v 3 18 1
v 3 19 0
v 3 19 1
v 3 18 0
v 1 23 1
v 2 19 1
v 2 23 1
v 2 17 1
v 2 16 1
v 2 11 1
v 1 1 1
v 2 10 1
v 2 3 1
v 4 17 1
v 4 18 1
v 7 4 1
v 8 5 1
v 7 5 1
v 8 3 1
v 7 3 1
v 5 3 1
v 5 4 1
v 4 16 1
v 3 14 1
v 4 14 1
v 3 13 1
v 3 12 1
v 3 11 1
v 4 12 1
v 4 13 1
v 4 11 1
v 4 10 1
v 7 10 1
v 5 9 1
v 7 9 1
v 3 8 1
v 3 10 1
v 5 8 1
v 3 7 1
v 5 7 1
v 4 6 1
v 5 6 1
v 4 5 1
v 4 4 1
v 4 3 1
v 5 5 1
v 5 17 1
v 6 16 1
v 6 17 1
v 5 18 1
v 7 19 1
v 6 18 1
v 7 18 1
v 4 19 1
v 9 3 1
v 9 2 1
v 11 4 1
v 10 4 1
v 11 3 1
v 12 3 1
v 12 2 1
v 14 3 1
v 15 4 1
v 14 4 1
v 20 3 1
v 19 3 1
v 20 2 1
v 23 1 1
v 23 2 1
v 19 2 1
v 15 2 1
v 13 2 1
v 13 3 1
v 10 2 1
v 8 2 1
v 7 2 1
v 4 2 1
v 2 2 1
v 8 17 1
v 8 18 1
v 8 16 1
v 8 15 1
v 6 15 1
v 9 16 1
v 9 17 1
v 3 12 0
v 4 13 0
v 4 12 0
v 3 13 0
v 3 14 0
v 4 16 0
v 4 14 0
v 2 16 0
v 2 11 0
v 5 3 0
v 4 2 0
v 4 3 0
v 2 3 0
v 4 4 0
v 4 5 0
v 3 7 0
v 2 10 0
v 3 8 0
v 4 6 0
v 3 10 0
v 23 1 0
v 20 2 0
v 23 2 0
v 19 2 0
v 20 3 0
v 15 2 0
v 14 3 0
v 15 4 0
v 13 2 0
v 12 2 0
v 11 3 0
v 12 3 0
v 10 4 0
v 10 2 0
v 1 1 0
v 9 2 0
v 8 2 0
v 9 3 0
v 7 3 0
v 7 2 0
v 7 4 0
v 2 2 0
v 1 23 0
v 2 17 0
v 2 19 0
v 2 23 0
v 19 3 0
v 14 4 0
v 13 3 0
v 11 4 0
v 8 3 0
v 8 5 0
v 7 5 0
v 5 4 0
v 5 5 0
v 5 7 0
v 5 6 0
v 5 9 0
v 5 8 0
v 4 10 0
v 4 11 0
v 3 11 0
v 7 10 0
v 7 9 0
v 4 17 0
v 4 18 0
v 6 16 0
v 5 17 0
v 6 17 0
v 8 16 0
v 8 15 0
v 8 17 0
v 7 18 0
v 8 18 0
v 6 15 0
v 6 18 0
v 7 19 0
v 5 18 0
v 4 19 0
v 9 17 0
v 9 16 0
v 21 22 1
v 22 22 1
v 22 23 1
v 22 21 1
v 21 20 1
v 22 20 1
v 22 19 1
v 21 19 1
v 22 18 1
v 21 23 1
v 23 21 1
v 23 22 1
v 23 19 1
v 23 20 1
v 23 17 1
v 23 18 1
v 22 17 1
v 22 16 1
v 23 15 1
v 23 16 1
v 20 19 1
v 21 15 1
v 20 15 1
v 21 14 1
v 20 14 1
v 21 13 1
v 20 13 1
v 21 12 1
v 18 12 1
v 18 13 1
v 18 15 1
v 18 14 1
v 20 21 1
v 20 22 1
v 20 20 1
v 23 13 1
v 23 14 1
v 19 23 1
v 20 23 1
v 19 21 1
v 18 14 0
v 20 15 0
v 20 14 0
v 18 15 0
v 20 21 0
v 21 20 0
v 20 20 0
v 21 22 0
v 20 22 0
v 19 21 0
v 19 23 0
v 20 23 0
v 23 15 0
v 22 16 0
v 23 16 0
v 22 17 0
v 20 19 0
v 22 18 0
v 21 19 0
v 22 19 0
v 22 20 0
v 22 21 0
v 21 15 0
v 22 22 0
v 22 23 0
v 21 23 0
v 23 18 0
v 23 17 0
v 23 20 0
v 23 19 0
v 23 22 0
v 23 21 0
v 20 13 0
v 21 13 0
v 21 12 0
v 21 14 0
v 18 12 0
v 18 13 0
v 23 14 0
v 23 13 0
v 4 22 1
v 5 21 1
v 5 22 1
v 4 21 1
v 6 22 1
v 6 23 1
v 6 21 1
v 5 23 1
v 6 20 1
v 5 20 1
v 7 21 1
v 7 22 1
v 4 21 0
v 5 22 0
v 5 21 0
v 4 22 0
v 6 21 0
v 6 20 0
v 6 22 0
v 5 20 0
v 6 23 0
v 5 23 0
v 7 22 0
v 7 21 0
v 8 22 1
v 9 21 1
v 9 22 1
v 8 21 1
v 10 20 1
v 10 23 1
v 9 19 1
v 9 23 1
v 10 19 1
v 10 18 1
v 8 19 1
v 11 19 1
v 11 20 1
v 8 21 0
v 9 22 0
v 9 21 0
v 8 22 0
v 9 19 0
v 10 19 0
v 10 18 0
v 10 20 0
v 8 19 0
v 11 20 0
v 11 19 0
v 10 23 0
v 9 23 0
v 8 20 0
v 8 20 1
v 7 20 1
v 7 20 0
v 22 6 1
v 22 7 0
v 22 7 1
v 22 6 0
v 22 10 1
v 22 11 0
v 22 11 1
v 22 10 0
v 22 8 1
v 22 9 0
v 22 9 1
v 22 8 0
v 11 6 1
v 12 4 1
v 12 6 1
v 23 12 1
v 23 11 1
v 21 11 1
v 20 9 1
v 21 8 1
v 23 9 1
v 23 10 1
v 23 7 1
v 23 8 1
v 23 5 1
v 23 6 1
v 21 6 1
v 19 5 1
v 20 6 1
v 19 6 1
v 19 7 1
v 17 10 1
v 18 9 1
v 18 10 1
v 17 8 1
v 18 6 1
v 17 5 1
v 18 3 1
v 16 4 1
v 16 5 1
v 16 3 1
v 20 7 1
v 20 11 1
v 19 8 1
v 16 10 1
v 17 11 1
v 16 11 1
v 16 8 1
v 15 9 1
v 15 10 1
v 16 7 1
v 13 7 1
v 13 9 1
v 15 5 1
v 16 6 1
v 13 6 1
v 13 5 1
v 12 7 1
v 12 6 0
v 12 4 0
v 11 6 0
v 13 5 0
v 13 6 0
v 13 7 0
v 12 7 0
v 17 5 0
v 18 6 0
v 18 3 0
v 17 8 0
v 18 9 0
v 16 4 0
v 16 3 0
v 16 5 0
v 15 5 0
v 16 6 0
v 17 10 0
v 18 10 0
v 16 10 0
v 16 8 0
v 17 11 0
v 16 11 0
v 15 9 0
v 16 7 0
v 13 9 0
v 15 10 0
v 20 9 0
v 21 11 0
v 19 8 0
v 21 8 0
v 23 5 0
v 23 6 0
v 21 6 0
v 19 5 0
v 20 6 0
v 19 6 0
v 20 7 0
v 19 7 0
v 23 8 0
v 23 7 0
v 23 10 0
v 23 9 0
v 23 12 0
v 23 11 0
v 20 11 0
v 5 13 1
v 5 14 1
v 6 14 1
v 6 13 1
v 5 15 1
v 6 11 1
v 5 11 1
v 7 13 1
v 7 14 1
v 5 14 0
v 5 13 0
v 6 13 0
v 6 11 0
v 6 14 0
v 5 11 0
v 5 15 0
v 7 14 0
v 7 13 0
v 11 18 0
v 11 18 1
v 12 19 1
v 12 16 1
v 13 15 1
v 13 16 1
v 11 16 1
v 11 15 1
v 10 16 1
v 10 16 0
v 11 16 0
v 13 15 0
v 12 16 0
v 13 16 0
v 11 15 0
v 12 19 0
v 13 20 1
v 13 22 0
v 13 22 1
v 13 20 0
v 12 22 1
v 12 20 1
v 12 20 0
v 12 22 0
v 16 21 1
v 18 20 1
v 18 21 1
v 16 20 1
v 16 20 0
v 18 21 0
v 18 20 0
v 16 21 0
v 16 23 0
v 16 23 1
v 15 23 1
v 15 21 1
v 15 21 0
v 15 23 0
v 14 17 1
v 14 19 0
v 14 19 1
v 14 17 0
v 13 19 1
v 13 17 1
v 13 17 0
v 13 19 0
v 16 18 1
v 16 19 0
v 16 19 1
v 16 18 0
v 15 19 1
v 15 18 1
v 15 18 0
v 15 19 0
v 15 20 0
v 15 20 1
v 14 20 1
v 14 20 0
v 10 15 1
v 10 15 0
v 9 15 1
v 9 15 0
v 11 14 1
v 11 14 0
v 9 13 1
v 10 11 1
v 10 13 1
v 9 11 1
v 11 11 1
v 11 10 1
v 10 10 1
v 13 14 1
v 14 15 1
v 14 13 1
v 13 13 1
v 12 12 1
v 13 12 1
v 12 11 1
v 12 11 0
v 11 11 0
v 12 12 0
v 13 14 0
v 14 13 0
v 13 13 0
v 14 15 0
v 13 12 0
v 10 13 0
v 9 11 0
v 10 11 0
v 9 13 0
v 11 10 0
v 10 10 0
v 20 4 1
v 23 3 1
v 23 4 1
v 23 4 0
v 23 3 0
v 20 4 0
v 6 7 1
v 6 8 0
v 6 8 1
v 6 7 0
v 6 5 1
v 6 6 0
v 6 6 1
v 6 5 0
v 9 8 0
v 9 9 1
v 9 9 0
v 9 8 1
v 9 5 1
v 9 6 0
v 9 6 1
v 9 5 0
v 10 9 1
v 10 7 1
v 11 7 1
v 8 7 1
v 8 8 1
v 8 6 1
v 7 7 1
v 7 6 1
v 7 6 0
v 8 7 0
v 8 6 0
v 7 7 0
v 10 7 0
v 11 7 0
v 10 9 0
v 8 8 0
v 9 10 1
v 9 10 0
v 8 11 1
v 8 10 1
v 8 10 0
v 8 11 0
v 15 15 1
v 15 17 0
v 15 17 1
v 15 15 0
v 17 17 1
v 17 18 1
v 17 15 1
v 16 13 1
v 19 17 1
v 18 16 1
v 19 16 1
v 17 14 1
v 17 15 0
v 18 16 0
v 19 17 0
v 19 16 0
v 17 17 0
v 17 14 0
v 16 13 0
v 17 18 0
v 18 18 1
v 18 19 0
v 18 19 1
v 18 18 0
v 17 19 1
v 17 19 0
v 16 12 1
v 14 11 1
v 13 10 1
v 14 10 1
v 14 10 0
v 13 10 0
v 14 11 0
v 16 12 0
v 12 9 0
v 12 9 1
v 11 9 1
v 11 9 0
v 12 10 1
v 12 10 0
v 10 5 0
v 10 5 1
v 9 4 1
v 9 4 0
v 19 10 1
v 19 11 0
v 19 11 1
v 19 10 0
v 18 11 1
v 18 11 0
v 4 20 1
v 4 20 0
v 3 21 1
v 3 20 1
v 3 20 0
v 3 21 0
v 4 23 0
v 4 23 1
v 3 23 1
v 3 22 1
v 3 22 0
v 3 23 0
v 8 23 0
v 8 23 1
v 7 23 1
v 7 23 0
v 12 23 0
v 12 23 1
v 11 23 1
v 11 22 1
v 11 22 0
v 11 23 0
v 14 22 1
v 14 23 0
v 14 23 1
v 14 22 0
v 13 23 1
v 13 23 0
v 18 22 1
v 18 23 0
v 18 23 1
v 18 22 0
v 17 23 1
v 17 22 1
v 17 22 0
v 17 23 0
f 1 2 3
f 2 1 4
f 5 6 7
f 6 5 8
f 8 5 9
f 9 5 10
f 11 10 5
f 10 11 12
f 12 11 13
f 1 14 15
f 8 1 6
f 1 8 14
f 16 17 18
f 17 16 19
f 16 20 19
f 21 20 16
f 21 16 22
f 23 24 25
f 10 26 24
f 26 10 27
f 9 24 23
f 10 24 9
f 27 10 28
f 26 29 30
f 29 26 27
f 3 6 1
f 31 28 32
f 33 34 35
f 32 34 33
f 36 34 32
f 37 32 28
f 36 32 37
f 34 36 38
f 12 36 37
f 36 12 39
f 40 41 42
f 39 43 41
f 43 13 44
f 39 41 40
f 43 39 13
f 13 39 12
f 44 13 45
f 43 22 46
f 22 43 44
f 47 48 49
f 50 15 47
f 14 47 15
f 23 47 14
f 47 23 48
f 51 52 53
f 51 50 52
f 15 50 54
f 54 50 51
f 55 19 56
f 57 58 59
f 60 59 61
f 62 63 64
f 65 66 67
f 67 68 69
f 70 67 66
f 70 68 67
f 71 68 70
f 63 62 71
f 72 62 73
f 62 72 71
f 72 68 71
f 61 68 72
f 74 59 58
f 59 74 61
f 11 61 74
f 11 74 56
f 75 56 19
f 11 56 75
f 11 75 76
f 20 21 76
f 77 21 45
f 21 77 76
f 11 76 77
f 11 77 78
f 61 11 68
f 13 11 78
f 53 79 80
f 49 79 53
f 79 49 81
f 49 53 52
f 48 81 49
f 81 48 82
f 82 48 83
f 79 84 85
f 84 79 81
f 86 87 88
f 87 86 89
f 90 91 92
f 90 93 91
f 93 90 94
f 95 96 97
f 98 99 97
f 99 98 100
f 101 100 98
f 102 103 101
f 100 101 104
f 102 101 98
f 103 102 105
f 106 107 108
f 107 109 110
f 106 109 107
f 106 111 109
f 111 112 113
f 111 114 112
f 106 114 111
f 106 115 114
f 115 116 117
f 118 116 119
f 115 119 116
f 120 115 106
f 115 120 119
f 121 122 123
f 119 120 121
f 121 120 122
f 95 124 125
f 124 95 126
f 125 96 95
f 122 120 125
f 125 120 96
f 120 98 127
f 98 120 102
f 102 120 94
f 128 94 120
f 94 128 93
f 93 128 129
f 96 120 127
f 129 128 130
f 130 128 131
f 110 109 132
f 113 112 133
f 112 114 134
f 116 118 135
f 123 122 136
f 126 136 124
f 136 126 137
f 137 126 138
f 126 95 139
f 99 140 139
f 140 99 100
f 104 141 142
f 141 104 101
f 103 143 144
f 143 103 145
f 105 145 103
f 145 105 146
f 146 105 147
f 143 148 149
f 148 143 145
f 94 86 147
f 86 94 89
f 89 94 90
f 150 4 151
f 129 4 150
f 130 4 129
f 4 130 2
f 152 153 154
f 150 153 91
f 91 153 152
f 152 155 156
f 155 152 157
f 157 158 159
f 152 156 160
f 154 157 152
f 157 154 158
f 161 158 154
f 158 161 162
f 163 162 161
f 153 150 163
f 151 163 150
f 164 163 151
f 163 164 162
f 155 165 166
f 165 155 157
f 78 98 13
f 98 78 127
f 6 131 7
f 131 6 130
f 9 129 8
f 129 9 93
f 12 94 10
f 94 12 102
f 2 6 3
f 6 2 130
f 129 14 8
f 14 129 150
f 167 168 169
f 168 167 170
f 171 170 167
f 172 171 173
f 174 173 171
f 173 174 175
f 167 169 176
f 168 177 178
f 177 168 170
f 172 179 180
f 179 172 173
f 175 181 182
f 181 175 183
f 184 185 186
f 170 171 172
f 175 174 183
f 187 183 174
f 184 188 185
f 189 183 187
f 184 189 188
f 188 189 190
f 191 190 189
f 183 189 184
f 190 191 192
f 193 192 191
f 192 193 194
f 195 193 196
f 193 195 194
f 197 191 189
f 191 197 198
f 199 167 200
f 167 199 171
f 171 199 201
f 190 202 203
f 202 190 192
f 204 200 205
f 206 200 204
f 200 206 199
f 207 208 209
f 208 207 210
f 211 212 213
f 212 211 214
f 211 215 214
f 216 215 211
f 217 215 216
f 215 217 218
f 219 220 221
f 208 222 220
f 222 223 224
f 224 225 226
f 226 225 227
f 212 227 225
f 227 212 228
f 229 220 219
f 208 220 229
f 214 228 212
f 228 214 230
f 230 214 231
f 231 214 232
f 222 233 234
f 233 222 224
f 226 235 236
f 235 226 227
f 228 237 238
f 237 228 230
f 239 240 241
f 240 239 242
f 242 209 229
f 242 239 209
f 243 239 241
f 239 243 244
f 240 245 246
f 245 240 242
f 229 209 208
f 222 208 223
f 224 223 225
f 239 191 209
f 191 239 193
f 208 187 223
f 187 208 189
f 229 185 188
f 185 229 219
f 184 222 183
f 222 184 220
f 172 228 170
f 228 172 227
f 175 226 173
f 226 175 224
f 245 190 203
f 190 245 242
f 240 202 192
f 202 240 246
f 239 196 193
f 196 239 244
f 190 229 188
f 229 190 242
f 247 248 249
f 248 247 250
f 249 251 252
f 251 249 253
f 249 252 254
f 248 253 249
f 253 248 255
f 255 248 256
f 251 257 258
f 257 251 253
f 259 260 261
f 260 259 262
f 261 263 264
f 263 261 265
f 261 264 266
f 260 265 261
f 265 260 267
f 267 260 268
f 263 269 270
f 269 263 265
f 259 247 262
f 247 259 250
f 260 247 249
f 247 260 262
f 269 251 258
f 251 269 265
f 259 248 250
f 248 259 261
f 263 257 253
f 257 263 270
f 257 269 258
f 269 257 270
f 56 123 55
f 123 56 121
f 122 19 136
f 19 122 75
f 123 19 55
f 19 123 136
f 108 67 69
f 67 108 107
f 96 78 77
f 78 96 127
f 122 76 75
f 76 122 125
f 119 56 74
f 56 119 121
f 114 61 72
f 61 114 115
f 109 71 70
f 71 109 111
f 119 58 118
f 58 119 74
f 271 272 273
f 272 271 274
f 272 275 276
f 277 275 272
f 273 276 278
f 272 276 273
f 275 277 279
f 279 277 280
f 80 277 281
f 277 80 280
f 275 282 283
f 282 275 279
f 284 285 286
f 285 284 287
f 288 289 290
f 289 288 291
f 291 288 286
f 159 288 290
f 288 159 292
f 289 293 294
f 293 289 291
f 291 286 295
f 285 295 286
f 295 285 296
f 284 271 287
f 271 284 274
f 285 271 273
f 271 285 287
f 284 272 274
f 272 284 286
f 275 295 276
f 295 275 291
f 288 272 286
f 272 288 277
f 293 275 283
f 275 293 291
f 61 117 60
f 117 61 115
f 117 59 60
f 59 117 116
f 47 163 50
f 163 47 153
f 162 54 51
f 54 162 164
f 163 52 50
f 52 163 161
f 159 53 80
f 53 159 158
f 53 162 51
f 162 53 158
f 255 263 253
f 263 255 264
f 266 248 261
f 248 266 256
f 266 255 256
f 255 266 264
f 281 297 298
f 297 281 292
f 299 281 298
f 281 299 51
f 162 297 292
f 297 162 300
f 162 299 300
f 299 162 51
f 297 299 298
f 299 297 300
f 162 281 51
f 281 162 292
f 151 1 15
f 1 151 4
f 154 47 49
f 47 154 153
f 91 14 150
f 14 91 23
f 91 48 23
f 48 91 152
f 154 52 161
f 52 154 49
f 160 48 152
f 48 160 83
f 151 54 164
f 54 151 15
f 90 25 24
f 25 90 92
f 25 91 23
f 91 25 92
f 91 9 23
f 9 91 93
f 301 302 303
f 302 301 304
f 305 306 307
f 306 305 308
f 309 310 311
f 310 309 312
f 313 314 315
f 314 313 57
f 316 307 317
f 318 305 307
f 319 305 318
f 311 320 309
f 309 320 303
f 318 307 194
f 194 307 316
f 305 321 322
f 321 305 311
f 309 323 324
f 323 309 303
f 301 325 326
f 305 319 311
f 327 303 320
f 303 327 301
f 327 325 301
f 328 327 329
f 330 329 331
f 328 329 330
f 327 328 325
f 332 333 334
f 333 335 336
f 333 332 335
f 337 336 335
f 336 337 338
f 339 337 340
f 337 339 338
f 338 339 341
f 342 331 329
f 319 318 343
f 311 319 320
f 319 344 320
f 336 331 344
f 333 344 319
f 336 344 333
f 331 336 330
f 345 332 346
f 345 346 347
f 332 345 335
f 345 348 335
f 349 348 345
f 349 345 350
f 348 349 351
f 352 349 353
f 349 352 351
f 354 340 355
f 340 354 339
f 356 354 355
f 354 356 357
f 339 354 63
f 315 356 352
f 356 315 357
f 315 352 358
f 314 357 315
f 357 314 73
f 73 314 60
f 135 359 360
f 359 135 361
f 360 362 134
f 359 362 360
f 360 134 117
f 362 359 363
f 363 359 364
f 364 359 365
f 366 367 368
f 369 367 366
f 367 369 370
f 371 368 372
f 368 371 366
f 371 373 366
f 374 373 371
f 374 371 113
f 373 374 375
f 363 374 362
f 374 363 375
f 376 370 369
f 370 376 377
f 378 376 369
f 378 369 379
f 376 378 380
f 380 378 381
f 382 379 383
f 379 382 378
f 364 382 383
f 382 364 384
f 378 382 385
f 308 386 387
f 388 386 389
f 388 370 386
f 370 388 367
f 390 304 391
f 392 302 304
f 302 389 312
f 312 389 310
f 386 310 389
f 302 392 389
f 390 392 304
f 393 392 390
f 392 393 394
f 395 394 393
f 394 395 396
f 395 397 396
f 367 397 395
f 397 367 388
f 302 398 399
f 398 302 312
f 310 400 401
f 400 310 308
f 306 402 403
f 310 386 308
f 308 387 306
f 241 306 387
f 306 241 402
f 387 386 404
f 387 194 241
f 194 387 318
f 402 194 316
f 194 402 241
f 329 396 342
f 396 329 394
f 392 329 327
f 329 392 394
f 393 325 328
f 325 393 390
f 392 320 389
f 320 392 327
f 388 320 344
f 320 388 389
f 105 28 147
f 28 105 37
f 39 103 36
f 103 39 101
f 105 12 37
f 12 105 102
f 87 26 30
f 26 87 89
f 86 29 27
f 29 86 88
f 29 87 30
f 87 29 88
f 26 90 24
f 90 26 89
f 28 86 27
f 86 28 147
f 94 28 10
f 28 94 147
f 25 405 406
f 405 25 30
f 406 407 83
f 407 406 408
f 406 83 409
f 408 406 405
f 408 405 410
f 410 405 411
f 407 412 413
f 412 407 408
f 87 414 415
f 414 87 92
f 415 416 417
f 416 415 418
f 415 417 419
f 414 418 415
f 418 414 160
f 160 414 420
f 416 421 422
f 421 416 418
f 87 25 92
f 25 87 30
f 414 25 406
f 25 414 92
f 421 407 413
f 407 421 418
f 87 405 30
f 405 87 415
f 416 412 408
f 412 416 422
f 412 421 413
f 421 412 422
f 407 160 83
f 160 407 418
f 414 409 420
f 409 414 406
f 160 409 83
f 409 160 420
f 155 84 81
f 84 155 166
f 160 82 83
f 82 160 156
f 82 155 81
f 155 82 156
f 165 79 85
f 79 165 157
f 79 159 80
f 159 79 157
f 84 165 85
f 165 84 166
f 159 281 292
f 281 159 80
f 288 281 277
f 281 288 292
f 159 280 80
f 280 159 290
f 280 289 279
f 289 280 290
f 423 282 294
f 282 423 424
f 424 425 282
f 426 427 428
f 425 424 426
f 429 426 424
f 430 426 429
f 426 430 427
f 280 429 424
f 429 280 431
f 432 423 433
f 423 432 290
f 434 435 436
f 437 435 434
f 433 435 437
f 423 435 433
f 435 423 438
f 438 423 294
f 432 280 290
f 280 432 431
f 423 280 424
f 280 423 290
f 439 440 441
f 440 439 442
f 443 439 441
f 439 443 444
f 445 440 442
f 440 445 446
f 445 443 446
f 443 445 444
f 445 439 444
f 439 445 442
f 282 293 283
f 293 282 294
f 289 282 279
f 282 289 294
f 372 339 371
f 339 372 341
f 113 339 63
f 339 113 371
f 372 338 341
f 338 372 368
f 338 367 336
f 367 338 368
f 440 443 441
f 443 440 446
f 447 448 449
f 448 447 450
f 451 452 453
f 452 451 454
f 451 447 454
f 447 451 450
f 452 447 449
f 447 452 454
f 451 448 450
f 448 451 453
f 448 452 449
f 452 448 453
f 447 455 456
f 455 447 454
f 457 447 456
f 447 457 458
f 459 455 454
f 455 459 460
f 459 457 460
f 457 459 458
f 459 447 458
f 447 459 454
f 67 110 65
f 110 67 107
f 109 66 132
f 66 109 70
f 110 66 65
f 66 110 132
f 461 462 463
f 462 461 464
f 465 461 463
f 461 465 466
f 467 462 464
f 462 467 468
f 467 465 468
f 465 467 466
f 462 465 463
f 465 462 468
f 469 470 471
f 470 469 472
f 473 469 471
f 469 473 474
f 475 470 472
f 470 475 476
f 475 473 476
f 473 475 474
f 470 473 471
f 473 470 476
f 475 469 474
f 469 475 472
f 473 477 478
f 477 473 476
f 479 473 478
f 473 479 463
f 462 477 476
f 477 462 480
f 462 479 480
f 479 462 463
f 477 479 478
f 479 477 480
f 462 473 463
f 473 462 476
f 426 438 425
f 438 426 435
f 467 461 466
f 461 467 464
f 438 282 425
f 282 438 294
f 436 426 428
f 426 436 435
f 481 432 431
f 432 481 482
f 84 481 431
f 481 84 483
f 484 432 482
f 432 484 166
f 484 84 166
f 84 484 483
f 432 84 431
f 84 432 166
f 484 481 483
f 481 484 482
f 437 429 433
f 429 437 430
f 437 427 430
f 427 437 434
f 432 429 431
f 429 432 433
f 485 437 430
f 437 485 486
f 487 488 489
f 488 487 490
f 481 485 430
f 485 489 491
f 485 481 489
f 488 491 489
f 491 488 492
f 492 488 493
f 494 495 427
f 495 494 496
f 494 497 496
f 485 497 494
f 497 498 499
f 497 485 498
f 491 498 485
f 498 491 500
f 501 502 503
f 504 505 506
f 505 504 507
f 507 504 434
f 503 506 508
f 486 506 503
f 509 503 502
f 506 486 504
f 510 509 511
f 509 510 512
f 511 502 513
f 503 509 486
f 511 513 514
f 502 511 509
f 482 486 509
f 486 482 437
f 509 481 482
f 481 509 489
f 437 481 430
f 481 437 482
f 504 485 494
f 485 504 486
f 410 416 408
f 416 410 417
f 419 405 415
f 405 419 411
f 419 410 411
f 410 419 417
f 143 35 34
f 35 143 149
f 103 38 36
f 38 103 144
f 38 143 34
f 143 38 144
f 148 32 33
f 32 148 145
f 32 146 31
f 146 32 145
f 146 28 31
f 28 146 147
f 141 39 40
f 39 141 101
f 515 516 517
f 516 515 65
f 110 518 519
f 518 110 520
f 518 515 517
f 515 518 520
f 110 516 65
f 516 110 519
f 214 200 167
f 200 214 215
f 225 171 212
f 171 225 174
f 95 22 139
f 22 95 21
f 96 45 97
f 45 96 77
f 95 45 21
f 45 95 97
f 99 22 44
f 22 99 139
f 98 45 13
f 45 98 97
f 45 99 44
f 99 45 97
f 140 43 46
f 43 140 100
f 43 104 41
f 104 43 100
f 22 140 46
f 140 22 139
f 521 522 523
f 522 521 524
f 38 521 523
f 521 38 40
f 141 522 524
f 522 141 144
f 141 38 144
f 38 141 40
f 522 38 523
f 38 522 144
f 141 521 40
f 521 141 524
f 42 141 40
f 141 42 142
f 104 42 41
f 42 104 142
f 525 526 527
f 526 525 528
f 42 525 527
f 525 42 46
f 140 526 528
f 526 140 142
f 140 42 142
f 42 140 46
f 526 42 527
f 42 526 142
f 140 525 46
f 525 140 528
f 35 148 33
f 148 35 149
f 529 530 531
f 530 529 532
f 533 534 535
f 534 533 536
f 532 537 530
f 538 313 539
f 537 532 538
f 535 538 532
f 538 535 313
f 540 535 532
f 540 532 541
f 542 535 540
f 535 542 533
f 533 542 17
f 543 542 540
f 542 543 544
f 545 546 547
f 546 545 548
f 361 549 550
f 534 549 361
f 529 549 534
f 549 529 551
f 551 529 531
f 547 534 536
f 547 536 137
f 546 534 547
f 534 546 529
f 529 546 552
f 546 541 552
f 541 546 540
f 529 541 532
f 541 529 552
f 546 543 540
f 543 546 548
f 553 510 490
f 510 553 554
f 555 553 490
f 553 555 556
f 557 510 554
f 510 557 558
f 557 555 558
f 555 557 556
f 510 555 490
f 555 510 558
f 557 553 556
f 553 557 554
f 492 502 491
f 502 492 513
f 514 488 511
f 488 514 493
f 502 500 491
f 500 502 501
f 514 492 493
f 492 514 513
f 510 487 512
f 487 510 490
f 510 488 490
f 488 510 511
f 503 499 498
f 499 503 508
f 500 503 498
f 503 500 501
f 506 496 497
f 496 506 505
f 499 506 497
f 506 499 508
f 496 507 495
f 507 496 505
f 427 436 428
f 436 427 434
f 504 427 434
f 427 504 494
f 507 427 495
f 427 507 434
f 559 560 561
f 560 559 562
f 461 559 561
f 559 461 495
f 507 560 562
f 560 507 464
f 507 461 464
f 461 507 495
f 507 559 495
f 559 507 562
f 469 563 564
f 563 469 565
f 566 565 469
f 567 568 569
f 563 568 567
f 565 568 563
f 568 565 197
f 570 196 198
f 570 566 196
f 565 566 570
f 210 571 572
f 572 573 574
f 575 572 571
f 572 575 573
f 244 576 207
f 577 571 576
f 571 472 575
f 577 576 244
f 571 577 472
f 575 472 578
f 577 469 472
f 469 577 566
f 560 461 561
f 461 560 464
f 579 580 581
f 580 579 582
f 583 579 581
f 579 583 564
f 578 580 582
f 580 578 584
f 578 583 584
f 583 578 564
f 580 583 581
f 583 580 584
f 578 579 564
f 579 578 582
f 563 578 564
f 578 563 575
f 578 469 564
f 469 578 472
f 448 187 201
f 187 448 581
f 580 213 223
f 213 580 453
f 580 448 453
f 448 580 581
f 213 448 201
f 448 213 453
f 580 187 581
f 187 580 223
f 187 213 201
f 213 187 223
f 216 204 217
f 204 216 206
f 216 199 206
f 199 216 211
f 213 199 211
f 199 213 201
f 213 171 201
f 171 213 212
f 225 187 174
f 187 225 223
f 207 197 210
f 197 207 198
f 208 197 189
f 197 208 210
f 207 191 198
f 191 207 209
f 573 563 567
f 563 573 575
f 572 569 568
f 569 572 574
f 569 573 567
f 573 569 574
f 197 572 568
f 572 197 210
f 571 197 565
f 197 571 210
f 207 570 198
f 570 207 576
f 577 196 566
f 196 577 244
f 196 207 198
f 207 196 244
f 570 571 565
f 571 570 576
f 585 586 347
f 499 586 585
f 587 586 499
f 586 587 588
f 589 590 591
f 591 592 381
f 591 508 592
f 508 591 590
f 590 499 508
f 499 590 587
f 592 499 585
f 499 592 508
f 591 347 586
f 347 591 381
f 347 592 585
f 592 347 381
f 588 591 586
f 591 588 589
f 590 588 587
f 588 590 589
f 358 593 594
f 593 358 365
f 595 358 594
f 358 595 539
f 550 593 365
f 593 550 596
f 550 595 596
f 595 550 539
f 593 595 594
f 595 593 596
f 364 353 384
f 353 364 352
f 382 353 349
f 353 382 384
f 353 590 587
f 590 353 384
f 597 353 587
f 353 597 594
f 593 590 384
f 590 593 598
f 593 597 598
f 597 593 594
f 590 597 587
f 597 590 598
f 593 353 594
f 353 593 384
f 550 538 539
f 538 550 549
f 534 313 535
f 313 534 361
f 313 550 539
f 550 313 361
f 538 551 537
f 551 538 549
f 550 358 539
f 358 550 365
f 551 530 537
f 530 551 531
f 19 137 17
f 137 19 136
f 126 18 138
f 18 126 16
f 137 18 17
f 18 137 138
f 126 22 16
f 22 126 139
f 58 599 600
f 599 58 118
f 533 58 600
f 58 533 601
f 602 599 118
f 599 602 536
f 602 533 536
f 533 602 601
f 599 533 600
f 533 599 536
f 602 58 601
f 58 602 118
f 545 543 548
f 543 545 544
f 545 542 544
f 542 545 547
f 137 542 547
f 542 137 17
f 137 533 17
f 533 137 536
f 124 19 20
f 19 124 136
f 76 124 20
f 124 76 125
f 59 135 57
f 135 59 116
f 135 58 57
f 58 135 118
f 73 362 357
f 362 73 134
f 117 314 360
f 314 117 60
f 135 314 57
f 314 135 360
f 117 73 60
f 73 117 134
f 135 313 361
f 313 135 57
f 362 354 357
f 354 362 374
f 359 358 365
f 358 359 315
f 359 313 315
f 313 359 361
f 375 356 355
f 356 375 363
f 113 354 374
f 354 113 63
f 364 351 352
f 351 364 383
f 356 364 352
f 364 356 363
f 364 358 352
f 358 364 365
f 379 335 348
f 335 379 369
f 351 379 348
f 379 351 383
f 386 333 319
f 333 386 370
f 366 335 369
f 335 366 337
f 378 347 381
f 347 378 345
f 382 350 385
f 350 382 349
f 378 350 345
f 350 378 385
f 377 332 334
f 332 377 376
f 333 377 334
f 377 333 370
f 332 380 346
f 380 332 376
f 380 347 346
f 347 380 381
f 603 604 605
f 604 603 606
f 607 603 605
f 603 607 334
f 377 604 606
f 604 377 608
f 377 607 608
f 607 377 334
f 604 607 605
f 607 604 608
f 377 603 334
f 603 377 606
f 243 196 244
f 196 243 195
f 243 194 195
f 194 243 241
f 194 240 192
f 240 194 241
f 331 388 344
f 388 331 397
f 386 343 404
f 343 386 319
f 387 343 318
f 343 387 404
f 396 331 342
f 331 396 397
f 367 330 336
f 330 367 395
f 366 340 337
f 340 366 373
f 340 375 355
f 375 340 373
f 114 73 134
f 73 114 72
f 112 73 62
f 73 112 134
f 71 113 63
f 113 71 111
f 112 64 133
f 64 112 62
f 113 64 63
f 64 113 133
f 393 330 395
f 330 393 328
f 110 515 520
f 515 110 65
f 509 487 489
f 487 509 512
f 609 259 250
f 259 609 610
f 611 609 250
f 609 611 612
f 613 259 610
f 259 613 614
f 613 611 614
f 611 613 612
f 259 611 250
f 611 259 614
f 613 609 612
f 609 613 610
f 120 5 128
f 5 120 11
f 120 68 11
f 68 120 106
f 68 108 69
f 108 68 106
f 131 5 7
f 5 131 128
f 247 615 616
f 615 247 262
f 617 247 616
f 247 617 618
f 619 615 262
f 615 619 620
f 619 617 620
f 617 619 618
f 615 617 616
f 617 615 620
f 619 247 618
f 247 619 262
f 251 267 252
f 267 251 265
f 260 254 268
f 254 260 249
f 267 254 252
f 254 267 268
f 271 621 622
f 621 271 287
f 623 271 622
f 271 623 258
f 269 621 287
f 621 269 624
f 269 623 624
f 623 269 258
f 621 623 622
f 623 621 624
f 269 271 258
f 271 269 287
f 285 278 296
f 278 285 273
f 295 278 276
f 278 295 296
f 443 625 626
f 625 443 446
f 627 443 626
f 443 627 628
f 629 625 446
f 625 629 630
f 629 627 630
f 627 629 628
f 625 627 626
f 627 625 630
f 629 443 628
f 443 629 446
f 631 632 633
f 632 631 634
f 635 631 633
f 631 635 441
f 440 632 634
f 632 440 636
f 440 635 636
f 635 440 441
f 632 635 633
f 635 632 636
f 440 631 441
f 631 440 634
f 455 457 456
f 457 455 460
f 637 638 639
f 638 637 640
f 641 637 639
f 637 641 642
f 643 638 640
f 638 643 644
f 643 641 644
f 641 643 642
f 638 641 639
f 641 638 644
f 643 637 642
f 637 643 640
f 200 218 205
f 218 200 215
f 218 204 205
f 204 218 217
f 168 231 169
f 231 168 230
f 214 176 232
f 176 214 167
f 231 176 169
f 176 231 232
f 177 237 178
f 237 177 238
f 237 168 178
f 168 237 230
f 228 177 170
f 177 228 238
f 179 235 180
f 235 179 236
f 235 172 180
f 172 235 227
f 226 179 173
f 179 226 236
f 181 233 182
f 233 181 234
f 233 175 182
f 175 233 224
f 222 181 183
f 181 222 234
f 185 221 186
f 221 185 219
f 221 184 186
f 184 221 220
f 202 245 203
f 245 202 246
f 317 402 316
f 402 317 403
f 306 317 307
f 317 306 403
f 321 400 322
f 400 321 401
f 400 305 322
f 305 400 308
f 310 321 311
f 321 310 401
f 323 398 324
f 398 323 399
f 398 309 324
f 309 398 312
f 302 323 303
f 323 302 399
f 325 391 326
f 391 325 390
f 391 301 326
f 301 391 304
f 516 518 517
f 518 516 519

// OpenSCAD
// file: ../../util/bitmap.scad
/*****************************************************************************
 * Module Bitmap Library
 * Modules to create bitmaps of unit squares from 1 or 2 dimensional vectors.
 *****************************************************************************
 * Copyright 2017 Chris Baker
 *
 * This program is free software: you can redistribute it and/or modify
 * it under the terms of the GNU Lesser General Public License as published by
 * the Free Software Foundation, either version 3 of the License, or
 * (at your option) any later version.
 *
 * This program is distributed in the hope that it will be useful,
 * but WITHOUT ANY WARRANTY; without even the implied warranty of
 * MERCHANTABILITY or FITNESS FOR A PARTICULAR PURPOSE.  See the
 * GNU Lesser General Public License for more details.
 *
 * You should have received a copy of the GNU Lesser General Public License
 * along with this program.  If not, see <http://www.gnu.org/licenses/>.
 *****************************************************************************
 * Usage:
 * Include this file with the "use" tag.
 * Depends on compat.scad library.
 *
 * API:
 *   1dbitmap(bitmap, center, expansion, vector_mode)
 *   2dbitmap(bitmap, center, expansion, vector_mode)
 *     Generate a 1 or 2-Dimensional field of modules based on the provided
 *     bitmap vector. See Bitmap Vectors below.
 *     The center flag determines whether to center the bitmap on the origin.
 *     The expansion value actually shrinks each cube in the x and y
 *     dimension by the specified amount.
 *     The vector_mode flag determines whether to create 3D solid geometry
 *     (unit cubes) or 2D vector geometry (squares).
 *
 * Bitmap Vectors:
 *   The bitmap vectors primarily provide boolean information.
 *   A module will be placed where these vectors have a postive value and
 *   skipped where they have a negative value. I.E. 0, -1, false, and undef
 *   are all equivalent and result in a skip. 1 and true are equivalent and
 *   result in a placed 1-unit module.
 *   Further, if the value is an integer it will be treated as a height for
 *   the module, allowing z-maps to be created.
 *   If the value is not an integer or boolean, it will be treated as a color
 *   reference. This can be a string or RGBA vector that will be used to
 *   color the module in the OpenSCAD preview window.
 *   In current versions of OpenSCAD, the color has no effect in the rendered
 *   view or STL output.
 *
 * Vector Mode:
 *   Although OpenSCAD supports generating 2D geometry, there are several
 *   caveats:
 *   - 2D and 3D geometry cannot be mixed
 *   - Extruding 2D geometry causes color information to be lost
 *   - All 2D geometry is projected onto the XY plane when rendering
 *   - Rendering also results in loss of color (same as 3D)
 *   - The SVG exporter is somewhat limited:
 *     - The pixel size of the image is hard-coded in the file
 *     - The title of the image is a generic string
 *     - The color selection for stroke and fill is fixed
 *     - The stroke-width is set to a large value that will cause overlap
 *     - The background is transparent
 *     - Only one path element is created with all of the geometry; there is
 *       no easy way to split up the geometry into multiple logical units.
 *     - These issues can mostly be resolved by hand-editing the file:
 *       - Remove or modify the width and height parameters from the svg
 *         element at the top of the file to provide better scaling.
 *       - Edit the title element at the top of the file to change the title.
 *       - Edit the stroke and fill parameters of the path element (these will
 *         probably be at the end of the file).
 *       - Set the stroke-width parameter for the path element to 0.
 *****************************************************************************/
use <compat.scad>

/*
 * 2dbitmap - Turn a 2D vector into a bitmap of cubes
 *
 * bitmap - 2D vector representing where to place each cube
 *          Value can either be boolean, z-height, or color
 * center - center cubes around the origin
 * expansion - size of gap around each pixel (screendoor)
 * vector_mode - create a 2D vector drawing instead of 3D extrusion
 */
module 2dbitmap(bitmap=[[1,0],[0,1]], center=false, expansion=0, vector_mode=false)
{
	ylen=len(bitmap)-1;

	for (y=[0:ylen]) {
		xlen=len(bitmap[y])-1;
		for (x=[0:xlen])
			translate([x-(center?xlen/2:0),ylen-y-(center?ylen/2:0),0])
				if (is_indexable(bitmap[y][x]))
					color(bitmap[y][x])
						if (vector_mode)
							square([1-expansion,1-expansion], center=center);
						else
							cube([1-expansion,1-expansion,1], center=center);
				else
					if (bitmap[y][x])
						if (vector_mode)
							square([1-expansion,1-expansion], center=center);
						else
							cube([1-expansion,1-expansion,clamp_nonnum(bitmap[y][x])], center=center);
	}
}

module 1dbitmap(bitmap=[1,0,1,0,1], center=false, expansion=0, vector_mode=false)
	2dbitmap([bitmap], center, expansion, vector_mode);

/*
 * Examples
 */

// 1D with z-height
translate([10,0,0]) scale([1,10,1])
	1dbitmap(bitmap=[1,1,0,2,0,0,3], expansion=.1);

// 1D with boolean
translate([-20,0,0]) scale([1,10,1])
	1dbitmap(bitmap=[true,false,true,false,true,true]);

// 2D with z-height
scale([2,2,1])
	2dbitmap(bitmap=[[1,0,2,1],[0,3,3,0],[1,1,0,1]],
		center=true);

// 1D with color
translate([0,-10,0]) scale([1,3,1])
	1dbitmap(bitmap=["red","white","blue",[0,0.3,0,0.5]]);

// 1D with color using 2D-vector-mode
translate([-7,-8,0]) scale([1,2])
	1dbitmap(bitmap=["red",0,"blue",0,"green"], vector_mode=true);
translate([-4.5,-10,0]) scale([1,2])
	1dbitmap(bitmap=["red",0,"blue",0,"green"], vector_mode=true, center=true);
// file: ../../util/bitlib.scad
/*****************************************************************************
 * Bit Manipulation Library
 * Provides some useful bit manipulation functions.
 *****************************************************************************
 * Copyright 2017 Chris Baker
 *
 * This program is free software: you can redistribute it and/or modify
 * it under the terms of the GNU Lesser General Public License as published by
 * the Free Software Foundation, either version 3 of the License, or
 * (at your option) any later version.
 *
 * This program is distributed in the hope that it will be useful,
 * but WITHOUT ANY WARRANTY; without even the implied warranty of
 * MERCHANTABILITY or FITNESS FOR A PARTICULAR PURPOSE.  See the
 * GNU Lesser General Public License for more details.
 *
 * You should have received a copy of the GNU Lesser General Public License
 * along with this program.  If not, see <http://www.gnu.org/licenses/>.
 *****************************************************************************
 * Usage:
 * Include this file with the "use" tag.
 * When run on its own, all echo statements in this
 * library should print "true".
 *
 * API:
 *   bit(v,b)
 *     Return the truth value of the b'th bit of v.
 *
 *   check_bit_size(v,b,signed=false)
 *     Determine whether the value v can be represented
 *     with b bits (b must be positive).
 *     The signed flag indicates whether to include the
 *     sign bit in the determination; otherwise negative
 *     values will result in undef being returned.
 *
 *   xor(a,b)
 *     Return the value of a xor b.
 *     Handles arbitrary size values for a and b.
 *     Handles negative values as expected (a positive
 *     result will be returned unless a and b have
 *     differing signs).
 *
 * TODO:
 *  - Change echos to asserts (future OpenSCAD version)
 *  - Add more functions
 *
 *****************************************************************************/

//Return the truth value of the b'th bit of v
function bit(v,b) =
	((v==undef)||(b==undef)||(b<0))?undef:
	(floor(v / pow(2, b)) % 2)?true:false;

echo("*** bit() testcases ***");
echo(0,bit(0,0)==false);
echo(1,bit(-1,0)==true);
echo(2,bit(1,0)==true);
echo(3,[for (i=[0:63]) bit(0,i)]==[for (i=[0:63]) false]); //0=0...0
echo(4,[for (i=[0:63]) bit(-1,i)]==[for (i=[0:63]) true]); //-1=1...1
echo(5,[for (i=[1:63]) bit(1,i)]==[for (i=[1:63]) false]); //1=0...01
echo(6,[for (i=[0:7]) bit(85,i)?1:0]==[1,0,1,0,1,0,1,0]); //85=01010101
echo(7,[for (i=[0:7]) bit(170,i)?1:0]==[0,1,0,1,0,1,0,1]); //170=10101010
echo(8,[for (i=[0:7]) bit(165,i)?1:0]==[1,0,1,0,0,1,0,1]); //165=10100101
echo(9,[for (i=[0:7]) bit(56,i)?1:0]==[0,0,0,1,1,1,0,0]); //56=00111000
echo(10,[for (i=[0:7]) bit(-3,i)?1:0]==[1,0,1,1,1,1,1,1]); //-3=1...101
//(2^64)=0...01 0...0
echo(11,bit(pow(2,64),64)==true);
echo(12,[for (i=[0:63]) bit(pow(2,64),i)]==[for (i=[0:63]) false]);
echo(13,[for (i=[65:127]) bit(pow(2,64),i)]==[for (i=[1:63]) false]);
//-(2^64)=1...1 0...0
echo(14,[for (i=[0:63]) bit(-pow(2,64),i)]==[for (i=[0:63]) false]);
echo(15,[for (i=[64:127]) bit(-pow(2,64),i)]==[for (i=[0:63]) true]);
echo(16,bit(10,-1)==undef);
echo(17,bit(10,undef)==undef);
echo(18,bit(undef,3)==undef);

//return true if v can be represented in b bits
//if signed flag is set. the result will be adjusted
//to account for the needed sign bit
function check_bit_size(v,b,signed=false) =
	(b<0)?undef:
	(v==undef)?undef:
	(b==0)?false:
	(v==0)?true: //(b>0)
	(signed)?
		(v<0)?(-pow(2,b-1)<(v+1)):
			(pow(2,b-1)>(v+1)):
		(v<0)?undef:
			(pow(2,b)>v);

echo("*** check_bit_size() testcases ***");
echo(0,check_bit_size(-1,2)==undef);
echo(1,check_bit_size(2,-4)==undef);
echo(2,check_bit_size(2,-4,signed=true)==undef);
echo(3,check_bit_size(0,0)==false);
echo(4,check_bit_size(0,1)==true);
echo(5,check_bit_size(1,0)==false);
echo(6,check_bit_size(1,1)==true);
echo(7,check_bit_size(7,3)==true);
echo(8,check_bit_size(8,3)==false);
echo(9,check_bit_size(1,3)==true);
echo(10,check_bit_size(256,8)==false);
echo(11,check_bit_size(255,8)==true);
echo(12,check_bit_size(10,2)==false);
echo(13,check_bit_size(10,4)==true);
echo(14,check_bit_size(-10,2,signed=true)==false);
echo(15,check_bit_size(-10,4,signed=true)==false);
echo(16,check_bit_size(-10,5,signed=true)==true);
echo(17,check_bit_size(-1,0,signed=true)==false);
echo(18,check_bit_size(-1,1,signed=true)==true);
echo(19,check_bit_size(0,0,signed=true)==false);
echo(20,check_bit_size(0,1,signed=true)==true);
echo(21,check_bit_size(-2,2,signed=true)==true);
echo(22,check_bit_size(-3,2,signed=true)==false);
echo(23,check_bit_size(-3,3,signed=true)==true);
echo(24,check_bit_size(-8,3,signed=true)==false);
echo(25,check_bit_size(-8,4,signed=true)==true);
echo(26,check_bit_size(undef,4)==undef);
echo(27,check_bit_size(undef,4,signed=true)==undef);

//return the value of a xor b
//runs recursively until all bits of a and b are exhausted
function xor(a,b,i=0) =
	((a==undef)||(b==undef))?undef:
	let (c=bit(a,i), d=bit(b,i),
		 v=((c||d) && !(c&&d))?pow(2,i):0)
		(check_bit_size(a,i,signed=true) &&
		 check_bit_size(b,i,signed=true))?
			-v: //special case for sign bit
			v+xor(a,b,i+1); //recursively add powers of 2

echo("*** xor() testcases ***");
echo(0,xor(42,0)==42);
echo(1,xor(42,42)==0);
echo(2,xor(169,238)==71); //10101001^11101110=01000111=71
echo(3,xor(238,169)==71);
echo(4,xor(42,238)==196); //00101010^11101110=11000100=196
echo(5,xor(169,42)==131); //10101001^00101010=10000011=131
echo(6,xor(-8,-10)==14); //11000^10110=01110=14
echo(7,xor(-7,-10)==15); //11001^10110=01111=15
echo(8,xor(9,-10)==-1); //01001^10110=11111=-1
echo(9,xor(9,-12)==-3); //01001^10100=11101=-3
echo(10,xor(undef,0)==undef);
// file: ../../util/stringlib.scad
/*****************************************************************************
 * String Manipulation Library
 * Provides some useful string manipulation functions.
 *****************************************************************************
 * Copyright 2017 Chris Baker
 *
 * This program is free software: you can redistribute it and/or modify
 * it under the terms of the GNU Lesser General Public License as published by
 * the Free Software Foundation, either version 3 of the License, or
 * (at your option) any later version.
 *
 * This program is distributed in the hope that it will be useful,
 * but WITHOUT ANY WARRANTY; without even the implied warranty of
 * MERCHANTABILITY or FITNESS FOR A PARTICULAR PURPOSE.  See the
 * GNU Lesser General Public License for more details.
 *
 * You should have received a copy of the GNU Lesser General Public License
 * along with this program.  If not, see <http://www.gnu.org/licenses/>.
 *****************************************************************************
 * Usage:
 * Include this file with the "use" tag.
 * When run on its own, all echo statements in this library should print
 * "true".
 *
 * API:
 *   atoi(a)
 *     Convert the string of numerals, a, to a vector of individual decimal
 *     numbers.
 *
 *   ascii_to_vec(a)
 *     Convert the ASCII string, a, into a vector of decimal numbers.
 *
 * TODO:
 *  - Change echos to asserts (future OpenSCAD version)
 *
 *****************************************************************************/

/*
 * atoi - convert ASCII numerals to a vector of individual decimal numbers
 *
 * a - the ASCII string of numerals
 */
function atoi(a) = (len(a)==undef)?undef:
[
	let (val = search(a, "0123456789"))
		for (i = val) i
];

echo("*** atoi() testcases ***");
echo(ascii_to_vec(undef)==undef);
echo(ascii_to_vec(true)==undef);
echo(ascii_to_vec(false)==undef);
echo(ascii_to_vec("")==[]);
echo(atoi("0")==[0]);
echo(atoi("1")==[1]);
echo(atoi("2")==[2]);
echo(atoi("3")==[3]);
echo(atoi("4")==[4]);
echo(atoi("5")==[5]);
echo(atoi("6")==[6]);
echo(atoi("7")==[7]);
echo(atoi("8")==[8]);
echo(atoi("9")==[9]);
echo(atoi("123")==[1,2,3]);
echo(atoi("1a23b")==[1,2,3]); //degenerate case, don't really care too much about the result

/*
 * ascii_to_vec - convert ASCII string to decimal vector
 *
 * a - the ASCII string to vectorize
 */
function ascii_to_vec(a) = (len(a)==undef)?undef:
[
	let (val = search(a, "\x01\x02\x03\x04\x05\x06\x07\x08\x09\x0a\x0b\x0c\x0d\x0e\x0f\x10\x11\x12\x13\x14\x15\x16\x17\x18\x19\x1a\x1b\x1c\x1d\x1e\x1f !\"#$%&'()*+,-./0123456789:;<=>?@ABCDEFGHIJKLMNOPQRSTUVWXYZ[\\]^_`abcdefghijklmnopqrstuvwxyz{|}~\x7f"))
		for (i = val) i+1
];

echo("*** ascii_to_vec() testcases ***");
echo(ascii_to_vec(undef)==undef);
echo(ascii_to_vec(true)==undef);
echo(ascii_to_vec(false)==undef);
echo(ascii_to_vec("")==[]);
echo(ascii_to_vec("0")==[48]);
echo(ascii_to_vec("a")==[97]);
echo(ascii_to_vec("0123456789")==[48,49,50,51,52,53,54,55,56,57]);
echo(ascii_to_vec("The quick brown fox jumped over the lazy dog.")
	==[84,104,101,32,113,117,105,99,107,32,98,114,111,119,110,32,102,111,120,32,106,117,109,112,101,100,32,111,118,101,114,32,116,104,101,32,108,97,122,121,32,100,111,103,46]);
// main file
/* Unit Test 11: 22x22 - 30 data bytes, 20 ecc bytes - expert_mode example */
/* This is the same as unit test 9 but using expert_mode */
/* padding and ecc bytes completely manually instead of using dm_pad() */
use <../datamatrix.scad>
data_matrix(
	concat(
		text_mode(),
		dm_text("Wikipedia, the free encyclopedi"),
		ascii_mode(),
		dm_ascii("a"),
		EOM(),
		[104,254,150,45,20,78,91,227,88,60,21,174,213,62,93,103,126,46,
			56,95,247,47,22,65]
	),
	mark="black", expert_mode=true);
